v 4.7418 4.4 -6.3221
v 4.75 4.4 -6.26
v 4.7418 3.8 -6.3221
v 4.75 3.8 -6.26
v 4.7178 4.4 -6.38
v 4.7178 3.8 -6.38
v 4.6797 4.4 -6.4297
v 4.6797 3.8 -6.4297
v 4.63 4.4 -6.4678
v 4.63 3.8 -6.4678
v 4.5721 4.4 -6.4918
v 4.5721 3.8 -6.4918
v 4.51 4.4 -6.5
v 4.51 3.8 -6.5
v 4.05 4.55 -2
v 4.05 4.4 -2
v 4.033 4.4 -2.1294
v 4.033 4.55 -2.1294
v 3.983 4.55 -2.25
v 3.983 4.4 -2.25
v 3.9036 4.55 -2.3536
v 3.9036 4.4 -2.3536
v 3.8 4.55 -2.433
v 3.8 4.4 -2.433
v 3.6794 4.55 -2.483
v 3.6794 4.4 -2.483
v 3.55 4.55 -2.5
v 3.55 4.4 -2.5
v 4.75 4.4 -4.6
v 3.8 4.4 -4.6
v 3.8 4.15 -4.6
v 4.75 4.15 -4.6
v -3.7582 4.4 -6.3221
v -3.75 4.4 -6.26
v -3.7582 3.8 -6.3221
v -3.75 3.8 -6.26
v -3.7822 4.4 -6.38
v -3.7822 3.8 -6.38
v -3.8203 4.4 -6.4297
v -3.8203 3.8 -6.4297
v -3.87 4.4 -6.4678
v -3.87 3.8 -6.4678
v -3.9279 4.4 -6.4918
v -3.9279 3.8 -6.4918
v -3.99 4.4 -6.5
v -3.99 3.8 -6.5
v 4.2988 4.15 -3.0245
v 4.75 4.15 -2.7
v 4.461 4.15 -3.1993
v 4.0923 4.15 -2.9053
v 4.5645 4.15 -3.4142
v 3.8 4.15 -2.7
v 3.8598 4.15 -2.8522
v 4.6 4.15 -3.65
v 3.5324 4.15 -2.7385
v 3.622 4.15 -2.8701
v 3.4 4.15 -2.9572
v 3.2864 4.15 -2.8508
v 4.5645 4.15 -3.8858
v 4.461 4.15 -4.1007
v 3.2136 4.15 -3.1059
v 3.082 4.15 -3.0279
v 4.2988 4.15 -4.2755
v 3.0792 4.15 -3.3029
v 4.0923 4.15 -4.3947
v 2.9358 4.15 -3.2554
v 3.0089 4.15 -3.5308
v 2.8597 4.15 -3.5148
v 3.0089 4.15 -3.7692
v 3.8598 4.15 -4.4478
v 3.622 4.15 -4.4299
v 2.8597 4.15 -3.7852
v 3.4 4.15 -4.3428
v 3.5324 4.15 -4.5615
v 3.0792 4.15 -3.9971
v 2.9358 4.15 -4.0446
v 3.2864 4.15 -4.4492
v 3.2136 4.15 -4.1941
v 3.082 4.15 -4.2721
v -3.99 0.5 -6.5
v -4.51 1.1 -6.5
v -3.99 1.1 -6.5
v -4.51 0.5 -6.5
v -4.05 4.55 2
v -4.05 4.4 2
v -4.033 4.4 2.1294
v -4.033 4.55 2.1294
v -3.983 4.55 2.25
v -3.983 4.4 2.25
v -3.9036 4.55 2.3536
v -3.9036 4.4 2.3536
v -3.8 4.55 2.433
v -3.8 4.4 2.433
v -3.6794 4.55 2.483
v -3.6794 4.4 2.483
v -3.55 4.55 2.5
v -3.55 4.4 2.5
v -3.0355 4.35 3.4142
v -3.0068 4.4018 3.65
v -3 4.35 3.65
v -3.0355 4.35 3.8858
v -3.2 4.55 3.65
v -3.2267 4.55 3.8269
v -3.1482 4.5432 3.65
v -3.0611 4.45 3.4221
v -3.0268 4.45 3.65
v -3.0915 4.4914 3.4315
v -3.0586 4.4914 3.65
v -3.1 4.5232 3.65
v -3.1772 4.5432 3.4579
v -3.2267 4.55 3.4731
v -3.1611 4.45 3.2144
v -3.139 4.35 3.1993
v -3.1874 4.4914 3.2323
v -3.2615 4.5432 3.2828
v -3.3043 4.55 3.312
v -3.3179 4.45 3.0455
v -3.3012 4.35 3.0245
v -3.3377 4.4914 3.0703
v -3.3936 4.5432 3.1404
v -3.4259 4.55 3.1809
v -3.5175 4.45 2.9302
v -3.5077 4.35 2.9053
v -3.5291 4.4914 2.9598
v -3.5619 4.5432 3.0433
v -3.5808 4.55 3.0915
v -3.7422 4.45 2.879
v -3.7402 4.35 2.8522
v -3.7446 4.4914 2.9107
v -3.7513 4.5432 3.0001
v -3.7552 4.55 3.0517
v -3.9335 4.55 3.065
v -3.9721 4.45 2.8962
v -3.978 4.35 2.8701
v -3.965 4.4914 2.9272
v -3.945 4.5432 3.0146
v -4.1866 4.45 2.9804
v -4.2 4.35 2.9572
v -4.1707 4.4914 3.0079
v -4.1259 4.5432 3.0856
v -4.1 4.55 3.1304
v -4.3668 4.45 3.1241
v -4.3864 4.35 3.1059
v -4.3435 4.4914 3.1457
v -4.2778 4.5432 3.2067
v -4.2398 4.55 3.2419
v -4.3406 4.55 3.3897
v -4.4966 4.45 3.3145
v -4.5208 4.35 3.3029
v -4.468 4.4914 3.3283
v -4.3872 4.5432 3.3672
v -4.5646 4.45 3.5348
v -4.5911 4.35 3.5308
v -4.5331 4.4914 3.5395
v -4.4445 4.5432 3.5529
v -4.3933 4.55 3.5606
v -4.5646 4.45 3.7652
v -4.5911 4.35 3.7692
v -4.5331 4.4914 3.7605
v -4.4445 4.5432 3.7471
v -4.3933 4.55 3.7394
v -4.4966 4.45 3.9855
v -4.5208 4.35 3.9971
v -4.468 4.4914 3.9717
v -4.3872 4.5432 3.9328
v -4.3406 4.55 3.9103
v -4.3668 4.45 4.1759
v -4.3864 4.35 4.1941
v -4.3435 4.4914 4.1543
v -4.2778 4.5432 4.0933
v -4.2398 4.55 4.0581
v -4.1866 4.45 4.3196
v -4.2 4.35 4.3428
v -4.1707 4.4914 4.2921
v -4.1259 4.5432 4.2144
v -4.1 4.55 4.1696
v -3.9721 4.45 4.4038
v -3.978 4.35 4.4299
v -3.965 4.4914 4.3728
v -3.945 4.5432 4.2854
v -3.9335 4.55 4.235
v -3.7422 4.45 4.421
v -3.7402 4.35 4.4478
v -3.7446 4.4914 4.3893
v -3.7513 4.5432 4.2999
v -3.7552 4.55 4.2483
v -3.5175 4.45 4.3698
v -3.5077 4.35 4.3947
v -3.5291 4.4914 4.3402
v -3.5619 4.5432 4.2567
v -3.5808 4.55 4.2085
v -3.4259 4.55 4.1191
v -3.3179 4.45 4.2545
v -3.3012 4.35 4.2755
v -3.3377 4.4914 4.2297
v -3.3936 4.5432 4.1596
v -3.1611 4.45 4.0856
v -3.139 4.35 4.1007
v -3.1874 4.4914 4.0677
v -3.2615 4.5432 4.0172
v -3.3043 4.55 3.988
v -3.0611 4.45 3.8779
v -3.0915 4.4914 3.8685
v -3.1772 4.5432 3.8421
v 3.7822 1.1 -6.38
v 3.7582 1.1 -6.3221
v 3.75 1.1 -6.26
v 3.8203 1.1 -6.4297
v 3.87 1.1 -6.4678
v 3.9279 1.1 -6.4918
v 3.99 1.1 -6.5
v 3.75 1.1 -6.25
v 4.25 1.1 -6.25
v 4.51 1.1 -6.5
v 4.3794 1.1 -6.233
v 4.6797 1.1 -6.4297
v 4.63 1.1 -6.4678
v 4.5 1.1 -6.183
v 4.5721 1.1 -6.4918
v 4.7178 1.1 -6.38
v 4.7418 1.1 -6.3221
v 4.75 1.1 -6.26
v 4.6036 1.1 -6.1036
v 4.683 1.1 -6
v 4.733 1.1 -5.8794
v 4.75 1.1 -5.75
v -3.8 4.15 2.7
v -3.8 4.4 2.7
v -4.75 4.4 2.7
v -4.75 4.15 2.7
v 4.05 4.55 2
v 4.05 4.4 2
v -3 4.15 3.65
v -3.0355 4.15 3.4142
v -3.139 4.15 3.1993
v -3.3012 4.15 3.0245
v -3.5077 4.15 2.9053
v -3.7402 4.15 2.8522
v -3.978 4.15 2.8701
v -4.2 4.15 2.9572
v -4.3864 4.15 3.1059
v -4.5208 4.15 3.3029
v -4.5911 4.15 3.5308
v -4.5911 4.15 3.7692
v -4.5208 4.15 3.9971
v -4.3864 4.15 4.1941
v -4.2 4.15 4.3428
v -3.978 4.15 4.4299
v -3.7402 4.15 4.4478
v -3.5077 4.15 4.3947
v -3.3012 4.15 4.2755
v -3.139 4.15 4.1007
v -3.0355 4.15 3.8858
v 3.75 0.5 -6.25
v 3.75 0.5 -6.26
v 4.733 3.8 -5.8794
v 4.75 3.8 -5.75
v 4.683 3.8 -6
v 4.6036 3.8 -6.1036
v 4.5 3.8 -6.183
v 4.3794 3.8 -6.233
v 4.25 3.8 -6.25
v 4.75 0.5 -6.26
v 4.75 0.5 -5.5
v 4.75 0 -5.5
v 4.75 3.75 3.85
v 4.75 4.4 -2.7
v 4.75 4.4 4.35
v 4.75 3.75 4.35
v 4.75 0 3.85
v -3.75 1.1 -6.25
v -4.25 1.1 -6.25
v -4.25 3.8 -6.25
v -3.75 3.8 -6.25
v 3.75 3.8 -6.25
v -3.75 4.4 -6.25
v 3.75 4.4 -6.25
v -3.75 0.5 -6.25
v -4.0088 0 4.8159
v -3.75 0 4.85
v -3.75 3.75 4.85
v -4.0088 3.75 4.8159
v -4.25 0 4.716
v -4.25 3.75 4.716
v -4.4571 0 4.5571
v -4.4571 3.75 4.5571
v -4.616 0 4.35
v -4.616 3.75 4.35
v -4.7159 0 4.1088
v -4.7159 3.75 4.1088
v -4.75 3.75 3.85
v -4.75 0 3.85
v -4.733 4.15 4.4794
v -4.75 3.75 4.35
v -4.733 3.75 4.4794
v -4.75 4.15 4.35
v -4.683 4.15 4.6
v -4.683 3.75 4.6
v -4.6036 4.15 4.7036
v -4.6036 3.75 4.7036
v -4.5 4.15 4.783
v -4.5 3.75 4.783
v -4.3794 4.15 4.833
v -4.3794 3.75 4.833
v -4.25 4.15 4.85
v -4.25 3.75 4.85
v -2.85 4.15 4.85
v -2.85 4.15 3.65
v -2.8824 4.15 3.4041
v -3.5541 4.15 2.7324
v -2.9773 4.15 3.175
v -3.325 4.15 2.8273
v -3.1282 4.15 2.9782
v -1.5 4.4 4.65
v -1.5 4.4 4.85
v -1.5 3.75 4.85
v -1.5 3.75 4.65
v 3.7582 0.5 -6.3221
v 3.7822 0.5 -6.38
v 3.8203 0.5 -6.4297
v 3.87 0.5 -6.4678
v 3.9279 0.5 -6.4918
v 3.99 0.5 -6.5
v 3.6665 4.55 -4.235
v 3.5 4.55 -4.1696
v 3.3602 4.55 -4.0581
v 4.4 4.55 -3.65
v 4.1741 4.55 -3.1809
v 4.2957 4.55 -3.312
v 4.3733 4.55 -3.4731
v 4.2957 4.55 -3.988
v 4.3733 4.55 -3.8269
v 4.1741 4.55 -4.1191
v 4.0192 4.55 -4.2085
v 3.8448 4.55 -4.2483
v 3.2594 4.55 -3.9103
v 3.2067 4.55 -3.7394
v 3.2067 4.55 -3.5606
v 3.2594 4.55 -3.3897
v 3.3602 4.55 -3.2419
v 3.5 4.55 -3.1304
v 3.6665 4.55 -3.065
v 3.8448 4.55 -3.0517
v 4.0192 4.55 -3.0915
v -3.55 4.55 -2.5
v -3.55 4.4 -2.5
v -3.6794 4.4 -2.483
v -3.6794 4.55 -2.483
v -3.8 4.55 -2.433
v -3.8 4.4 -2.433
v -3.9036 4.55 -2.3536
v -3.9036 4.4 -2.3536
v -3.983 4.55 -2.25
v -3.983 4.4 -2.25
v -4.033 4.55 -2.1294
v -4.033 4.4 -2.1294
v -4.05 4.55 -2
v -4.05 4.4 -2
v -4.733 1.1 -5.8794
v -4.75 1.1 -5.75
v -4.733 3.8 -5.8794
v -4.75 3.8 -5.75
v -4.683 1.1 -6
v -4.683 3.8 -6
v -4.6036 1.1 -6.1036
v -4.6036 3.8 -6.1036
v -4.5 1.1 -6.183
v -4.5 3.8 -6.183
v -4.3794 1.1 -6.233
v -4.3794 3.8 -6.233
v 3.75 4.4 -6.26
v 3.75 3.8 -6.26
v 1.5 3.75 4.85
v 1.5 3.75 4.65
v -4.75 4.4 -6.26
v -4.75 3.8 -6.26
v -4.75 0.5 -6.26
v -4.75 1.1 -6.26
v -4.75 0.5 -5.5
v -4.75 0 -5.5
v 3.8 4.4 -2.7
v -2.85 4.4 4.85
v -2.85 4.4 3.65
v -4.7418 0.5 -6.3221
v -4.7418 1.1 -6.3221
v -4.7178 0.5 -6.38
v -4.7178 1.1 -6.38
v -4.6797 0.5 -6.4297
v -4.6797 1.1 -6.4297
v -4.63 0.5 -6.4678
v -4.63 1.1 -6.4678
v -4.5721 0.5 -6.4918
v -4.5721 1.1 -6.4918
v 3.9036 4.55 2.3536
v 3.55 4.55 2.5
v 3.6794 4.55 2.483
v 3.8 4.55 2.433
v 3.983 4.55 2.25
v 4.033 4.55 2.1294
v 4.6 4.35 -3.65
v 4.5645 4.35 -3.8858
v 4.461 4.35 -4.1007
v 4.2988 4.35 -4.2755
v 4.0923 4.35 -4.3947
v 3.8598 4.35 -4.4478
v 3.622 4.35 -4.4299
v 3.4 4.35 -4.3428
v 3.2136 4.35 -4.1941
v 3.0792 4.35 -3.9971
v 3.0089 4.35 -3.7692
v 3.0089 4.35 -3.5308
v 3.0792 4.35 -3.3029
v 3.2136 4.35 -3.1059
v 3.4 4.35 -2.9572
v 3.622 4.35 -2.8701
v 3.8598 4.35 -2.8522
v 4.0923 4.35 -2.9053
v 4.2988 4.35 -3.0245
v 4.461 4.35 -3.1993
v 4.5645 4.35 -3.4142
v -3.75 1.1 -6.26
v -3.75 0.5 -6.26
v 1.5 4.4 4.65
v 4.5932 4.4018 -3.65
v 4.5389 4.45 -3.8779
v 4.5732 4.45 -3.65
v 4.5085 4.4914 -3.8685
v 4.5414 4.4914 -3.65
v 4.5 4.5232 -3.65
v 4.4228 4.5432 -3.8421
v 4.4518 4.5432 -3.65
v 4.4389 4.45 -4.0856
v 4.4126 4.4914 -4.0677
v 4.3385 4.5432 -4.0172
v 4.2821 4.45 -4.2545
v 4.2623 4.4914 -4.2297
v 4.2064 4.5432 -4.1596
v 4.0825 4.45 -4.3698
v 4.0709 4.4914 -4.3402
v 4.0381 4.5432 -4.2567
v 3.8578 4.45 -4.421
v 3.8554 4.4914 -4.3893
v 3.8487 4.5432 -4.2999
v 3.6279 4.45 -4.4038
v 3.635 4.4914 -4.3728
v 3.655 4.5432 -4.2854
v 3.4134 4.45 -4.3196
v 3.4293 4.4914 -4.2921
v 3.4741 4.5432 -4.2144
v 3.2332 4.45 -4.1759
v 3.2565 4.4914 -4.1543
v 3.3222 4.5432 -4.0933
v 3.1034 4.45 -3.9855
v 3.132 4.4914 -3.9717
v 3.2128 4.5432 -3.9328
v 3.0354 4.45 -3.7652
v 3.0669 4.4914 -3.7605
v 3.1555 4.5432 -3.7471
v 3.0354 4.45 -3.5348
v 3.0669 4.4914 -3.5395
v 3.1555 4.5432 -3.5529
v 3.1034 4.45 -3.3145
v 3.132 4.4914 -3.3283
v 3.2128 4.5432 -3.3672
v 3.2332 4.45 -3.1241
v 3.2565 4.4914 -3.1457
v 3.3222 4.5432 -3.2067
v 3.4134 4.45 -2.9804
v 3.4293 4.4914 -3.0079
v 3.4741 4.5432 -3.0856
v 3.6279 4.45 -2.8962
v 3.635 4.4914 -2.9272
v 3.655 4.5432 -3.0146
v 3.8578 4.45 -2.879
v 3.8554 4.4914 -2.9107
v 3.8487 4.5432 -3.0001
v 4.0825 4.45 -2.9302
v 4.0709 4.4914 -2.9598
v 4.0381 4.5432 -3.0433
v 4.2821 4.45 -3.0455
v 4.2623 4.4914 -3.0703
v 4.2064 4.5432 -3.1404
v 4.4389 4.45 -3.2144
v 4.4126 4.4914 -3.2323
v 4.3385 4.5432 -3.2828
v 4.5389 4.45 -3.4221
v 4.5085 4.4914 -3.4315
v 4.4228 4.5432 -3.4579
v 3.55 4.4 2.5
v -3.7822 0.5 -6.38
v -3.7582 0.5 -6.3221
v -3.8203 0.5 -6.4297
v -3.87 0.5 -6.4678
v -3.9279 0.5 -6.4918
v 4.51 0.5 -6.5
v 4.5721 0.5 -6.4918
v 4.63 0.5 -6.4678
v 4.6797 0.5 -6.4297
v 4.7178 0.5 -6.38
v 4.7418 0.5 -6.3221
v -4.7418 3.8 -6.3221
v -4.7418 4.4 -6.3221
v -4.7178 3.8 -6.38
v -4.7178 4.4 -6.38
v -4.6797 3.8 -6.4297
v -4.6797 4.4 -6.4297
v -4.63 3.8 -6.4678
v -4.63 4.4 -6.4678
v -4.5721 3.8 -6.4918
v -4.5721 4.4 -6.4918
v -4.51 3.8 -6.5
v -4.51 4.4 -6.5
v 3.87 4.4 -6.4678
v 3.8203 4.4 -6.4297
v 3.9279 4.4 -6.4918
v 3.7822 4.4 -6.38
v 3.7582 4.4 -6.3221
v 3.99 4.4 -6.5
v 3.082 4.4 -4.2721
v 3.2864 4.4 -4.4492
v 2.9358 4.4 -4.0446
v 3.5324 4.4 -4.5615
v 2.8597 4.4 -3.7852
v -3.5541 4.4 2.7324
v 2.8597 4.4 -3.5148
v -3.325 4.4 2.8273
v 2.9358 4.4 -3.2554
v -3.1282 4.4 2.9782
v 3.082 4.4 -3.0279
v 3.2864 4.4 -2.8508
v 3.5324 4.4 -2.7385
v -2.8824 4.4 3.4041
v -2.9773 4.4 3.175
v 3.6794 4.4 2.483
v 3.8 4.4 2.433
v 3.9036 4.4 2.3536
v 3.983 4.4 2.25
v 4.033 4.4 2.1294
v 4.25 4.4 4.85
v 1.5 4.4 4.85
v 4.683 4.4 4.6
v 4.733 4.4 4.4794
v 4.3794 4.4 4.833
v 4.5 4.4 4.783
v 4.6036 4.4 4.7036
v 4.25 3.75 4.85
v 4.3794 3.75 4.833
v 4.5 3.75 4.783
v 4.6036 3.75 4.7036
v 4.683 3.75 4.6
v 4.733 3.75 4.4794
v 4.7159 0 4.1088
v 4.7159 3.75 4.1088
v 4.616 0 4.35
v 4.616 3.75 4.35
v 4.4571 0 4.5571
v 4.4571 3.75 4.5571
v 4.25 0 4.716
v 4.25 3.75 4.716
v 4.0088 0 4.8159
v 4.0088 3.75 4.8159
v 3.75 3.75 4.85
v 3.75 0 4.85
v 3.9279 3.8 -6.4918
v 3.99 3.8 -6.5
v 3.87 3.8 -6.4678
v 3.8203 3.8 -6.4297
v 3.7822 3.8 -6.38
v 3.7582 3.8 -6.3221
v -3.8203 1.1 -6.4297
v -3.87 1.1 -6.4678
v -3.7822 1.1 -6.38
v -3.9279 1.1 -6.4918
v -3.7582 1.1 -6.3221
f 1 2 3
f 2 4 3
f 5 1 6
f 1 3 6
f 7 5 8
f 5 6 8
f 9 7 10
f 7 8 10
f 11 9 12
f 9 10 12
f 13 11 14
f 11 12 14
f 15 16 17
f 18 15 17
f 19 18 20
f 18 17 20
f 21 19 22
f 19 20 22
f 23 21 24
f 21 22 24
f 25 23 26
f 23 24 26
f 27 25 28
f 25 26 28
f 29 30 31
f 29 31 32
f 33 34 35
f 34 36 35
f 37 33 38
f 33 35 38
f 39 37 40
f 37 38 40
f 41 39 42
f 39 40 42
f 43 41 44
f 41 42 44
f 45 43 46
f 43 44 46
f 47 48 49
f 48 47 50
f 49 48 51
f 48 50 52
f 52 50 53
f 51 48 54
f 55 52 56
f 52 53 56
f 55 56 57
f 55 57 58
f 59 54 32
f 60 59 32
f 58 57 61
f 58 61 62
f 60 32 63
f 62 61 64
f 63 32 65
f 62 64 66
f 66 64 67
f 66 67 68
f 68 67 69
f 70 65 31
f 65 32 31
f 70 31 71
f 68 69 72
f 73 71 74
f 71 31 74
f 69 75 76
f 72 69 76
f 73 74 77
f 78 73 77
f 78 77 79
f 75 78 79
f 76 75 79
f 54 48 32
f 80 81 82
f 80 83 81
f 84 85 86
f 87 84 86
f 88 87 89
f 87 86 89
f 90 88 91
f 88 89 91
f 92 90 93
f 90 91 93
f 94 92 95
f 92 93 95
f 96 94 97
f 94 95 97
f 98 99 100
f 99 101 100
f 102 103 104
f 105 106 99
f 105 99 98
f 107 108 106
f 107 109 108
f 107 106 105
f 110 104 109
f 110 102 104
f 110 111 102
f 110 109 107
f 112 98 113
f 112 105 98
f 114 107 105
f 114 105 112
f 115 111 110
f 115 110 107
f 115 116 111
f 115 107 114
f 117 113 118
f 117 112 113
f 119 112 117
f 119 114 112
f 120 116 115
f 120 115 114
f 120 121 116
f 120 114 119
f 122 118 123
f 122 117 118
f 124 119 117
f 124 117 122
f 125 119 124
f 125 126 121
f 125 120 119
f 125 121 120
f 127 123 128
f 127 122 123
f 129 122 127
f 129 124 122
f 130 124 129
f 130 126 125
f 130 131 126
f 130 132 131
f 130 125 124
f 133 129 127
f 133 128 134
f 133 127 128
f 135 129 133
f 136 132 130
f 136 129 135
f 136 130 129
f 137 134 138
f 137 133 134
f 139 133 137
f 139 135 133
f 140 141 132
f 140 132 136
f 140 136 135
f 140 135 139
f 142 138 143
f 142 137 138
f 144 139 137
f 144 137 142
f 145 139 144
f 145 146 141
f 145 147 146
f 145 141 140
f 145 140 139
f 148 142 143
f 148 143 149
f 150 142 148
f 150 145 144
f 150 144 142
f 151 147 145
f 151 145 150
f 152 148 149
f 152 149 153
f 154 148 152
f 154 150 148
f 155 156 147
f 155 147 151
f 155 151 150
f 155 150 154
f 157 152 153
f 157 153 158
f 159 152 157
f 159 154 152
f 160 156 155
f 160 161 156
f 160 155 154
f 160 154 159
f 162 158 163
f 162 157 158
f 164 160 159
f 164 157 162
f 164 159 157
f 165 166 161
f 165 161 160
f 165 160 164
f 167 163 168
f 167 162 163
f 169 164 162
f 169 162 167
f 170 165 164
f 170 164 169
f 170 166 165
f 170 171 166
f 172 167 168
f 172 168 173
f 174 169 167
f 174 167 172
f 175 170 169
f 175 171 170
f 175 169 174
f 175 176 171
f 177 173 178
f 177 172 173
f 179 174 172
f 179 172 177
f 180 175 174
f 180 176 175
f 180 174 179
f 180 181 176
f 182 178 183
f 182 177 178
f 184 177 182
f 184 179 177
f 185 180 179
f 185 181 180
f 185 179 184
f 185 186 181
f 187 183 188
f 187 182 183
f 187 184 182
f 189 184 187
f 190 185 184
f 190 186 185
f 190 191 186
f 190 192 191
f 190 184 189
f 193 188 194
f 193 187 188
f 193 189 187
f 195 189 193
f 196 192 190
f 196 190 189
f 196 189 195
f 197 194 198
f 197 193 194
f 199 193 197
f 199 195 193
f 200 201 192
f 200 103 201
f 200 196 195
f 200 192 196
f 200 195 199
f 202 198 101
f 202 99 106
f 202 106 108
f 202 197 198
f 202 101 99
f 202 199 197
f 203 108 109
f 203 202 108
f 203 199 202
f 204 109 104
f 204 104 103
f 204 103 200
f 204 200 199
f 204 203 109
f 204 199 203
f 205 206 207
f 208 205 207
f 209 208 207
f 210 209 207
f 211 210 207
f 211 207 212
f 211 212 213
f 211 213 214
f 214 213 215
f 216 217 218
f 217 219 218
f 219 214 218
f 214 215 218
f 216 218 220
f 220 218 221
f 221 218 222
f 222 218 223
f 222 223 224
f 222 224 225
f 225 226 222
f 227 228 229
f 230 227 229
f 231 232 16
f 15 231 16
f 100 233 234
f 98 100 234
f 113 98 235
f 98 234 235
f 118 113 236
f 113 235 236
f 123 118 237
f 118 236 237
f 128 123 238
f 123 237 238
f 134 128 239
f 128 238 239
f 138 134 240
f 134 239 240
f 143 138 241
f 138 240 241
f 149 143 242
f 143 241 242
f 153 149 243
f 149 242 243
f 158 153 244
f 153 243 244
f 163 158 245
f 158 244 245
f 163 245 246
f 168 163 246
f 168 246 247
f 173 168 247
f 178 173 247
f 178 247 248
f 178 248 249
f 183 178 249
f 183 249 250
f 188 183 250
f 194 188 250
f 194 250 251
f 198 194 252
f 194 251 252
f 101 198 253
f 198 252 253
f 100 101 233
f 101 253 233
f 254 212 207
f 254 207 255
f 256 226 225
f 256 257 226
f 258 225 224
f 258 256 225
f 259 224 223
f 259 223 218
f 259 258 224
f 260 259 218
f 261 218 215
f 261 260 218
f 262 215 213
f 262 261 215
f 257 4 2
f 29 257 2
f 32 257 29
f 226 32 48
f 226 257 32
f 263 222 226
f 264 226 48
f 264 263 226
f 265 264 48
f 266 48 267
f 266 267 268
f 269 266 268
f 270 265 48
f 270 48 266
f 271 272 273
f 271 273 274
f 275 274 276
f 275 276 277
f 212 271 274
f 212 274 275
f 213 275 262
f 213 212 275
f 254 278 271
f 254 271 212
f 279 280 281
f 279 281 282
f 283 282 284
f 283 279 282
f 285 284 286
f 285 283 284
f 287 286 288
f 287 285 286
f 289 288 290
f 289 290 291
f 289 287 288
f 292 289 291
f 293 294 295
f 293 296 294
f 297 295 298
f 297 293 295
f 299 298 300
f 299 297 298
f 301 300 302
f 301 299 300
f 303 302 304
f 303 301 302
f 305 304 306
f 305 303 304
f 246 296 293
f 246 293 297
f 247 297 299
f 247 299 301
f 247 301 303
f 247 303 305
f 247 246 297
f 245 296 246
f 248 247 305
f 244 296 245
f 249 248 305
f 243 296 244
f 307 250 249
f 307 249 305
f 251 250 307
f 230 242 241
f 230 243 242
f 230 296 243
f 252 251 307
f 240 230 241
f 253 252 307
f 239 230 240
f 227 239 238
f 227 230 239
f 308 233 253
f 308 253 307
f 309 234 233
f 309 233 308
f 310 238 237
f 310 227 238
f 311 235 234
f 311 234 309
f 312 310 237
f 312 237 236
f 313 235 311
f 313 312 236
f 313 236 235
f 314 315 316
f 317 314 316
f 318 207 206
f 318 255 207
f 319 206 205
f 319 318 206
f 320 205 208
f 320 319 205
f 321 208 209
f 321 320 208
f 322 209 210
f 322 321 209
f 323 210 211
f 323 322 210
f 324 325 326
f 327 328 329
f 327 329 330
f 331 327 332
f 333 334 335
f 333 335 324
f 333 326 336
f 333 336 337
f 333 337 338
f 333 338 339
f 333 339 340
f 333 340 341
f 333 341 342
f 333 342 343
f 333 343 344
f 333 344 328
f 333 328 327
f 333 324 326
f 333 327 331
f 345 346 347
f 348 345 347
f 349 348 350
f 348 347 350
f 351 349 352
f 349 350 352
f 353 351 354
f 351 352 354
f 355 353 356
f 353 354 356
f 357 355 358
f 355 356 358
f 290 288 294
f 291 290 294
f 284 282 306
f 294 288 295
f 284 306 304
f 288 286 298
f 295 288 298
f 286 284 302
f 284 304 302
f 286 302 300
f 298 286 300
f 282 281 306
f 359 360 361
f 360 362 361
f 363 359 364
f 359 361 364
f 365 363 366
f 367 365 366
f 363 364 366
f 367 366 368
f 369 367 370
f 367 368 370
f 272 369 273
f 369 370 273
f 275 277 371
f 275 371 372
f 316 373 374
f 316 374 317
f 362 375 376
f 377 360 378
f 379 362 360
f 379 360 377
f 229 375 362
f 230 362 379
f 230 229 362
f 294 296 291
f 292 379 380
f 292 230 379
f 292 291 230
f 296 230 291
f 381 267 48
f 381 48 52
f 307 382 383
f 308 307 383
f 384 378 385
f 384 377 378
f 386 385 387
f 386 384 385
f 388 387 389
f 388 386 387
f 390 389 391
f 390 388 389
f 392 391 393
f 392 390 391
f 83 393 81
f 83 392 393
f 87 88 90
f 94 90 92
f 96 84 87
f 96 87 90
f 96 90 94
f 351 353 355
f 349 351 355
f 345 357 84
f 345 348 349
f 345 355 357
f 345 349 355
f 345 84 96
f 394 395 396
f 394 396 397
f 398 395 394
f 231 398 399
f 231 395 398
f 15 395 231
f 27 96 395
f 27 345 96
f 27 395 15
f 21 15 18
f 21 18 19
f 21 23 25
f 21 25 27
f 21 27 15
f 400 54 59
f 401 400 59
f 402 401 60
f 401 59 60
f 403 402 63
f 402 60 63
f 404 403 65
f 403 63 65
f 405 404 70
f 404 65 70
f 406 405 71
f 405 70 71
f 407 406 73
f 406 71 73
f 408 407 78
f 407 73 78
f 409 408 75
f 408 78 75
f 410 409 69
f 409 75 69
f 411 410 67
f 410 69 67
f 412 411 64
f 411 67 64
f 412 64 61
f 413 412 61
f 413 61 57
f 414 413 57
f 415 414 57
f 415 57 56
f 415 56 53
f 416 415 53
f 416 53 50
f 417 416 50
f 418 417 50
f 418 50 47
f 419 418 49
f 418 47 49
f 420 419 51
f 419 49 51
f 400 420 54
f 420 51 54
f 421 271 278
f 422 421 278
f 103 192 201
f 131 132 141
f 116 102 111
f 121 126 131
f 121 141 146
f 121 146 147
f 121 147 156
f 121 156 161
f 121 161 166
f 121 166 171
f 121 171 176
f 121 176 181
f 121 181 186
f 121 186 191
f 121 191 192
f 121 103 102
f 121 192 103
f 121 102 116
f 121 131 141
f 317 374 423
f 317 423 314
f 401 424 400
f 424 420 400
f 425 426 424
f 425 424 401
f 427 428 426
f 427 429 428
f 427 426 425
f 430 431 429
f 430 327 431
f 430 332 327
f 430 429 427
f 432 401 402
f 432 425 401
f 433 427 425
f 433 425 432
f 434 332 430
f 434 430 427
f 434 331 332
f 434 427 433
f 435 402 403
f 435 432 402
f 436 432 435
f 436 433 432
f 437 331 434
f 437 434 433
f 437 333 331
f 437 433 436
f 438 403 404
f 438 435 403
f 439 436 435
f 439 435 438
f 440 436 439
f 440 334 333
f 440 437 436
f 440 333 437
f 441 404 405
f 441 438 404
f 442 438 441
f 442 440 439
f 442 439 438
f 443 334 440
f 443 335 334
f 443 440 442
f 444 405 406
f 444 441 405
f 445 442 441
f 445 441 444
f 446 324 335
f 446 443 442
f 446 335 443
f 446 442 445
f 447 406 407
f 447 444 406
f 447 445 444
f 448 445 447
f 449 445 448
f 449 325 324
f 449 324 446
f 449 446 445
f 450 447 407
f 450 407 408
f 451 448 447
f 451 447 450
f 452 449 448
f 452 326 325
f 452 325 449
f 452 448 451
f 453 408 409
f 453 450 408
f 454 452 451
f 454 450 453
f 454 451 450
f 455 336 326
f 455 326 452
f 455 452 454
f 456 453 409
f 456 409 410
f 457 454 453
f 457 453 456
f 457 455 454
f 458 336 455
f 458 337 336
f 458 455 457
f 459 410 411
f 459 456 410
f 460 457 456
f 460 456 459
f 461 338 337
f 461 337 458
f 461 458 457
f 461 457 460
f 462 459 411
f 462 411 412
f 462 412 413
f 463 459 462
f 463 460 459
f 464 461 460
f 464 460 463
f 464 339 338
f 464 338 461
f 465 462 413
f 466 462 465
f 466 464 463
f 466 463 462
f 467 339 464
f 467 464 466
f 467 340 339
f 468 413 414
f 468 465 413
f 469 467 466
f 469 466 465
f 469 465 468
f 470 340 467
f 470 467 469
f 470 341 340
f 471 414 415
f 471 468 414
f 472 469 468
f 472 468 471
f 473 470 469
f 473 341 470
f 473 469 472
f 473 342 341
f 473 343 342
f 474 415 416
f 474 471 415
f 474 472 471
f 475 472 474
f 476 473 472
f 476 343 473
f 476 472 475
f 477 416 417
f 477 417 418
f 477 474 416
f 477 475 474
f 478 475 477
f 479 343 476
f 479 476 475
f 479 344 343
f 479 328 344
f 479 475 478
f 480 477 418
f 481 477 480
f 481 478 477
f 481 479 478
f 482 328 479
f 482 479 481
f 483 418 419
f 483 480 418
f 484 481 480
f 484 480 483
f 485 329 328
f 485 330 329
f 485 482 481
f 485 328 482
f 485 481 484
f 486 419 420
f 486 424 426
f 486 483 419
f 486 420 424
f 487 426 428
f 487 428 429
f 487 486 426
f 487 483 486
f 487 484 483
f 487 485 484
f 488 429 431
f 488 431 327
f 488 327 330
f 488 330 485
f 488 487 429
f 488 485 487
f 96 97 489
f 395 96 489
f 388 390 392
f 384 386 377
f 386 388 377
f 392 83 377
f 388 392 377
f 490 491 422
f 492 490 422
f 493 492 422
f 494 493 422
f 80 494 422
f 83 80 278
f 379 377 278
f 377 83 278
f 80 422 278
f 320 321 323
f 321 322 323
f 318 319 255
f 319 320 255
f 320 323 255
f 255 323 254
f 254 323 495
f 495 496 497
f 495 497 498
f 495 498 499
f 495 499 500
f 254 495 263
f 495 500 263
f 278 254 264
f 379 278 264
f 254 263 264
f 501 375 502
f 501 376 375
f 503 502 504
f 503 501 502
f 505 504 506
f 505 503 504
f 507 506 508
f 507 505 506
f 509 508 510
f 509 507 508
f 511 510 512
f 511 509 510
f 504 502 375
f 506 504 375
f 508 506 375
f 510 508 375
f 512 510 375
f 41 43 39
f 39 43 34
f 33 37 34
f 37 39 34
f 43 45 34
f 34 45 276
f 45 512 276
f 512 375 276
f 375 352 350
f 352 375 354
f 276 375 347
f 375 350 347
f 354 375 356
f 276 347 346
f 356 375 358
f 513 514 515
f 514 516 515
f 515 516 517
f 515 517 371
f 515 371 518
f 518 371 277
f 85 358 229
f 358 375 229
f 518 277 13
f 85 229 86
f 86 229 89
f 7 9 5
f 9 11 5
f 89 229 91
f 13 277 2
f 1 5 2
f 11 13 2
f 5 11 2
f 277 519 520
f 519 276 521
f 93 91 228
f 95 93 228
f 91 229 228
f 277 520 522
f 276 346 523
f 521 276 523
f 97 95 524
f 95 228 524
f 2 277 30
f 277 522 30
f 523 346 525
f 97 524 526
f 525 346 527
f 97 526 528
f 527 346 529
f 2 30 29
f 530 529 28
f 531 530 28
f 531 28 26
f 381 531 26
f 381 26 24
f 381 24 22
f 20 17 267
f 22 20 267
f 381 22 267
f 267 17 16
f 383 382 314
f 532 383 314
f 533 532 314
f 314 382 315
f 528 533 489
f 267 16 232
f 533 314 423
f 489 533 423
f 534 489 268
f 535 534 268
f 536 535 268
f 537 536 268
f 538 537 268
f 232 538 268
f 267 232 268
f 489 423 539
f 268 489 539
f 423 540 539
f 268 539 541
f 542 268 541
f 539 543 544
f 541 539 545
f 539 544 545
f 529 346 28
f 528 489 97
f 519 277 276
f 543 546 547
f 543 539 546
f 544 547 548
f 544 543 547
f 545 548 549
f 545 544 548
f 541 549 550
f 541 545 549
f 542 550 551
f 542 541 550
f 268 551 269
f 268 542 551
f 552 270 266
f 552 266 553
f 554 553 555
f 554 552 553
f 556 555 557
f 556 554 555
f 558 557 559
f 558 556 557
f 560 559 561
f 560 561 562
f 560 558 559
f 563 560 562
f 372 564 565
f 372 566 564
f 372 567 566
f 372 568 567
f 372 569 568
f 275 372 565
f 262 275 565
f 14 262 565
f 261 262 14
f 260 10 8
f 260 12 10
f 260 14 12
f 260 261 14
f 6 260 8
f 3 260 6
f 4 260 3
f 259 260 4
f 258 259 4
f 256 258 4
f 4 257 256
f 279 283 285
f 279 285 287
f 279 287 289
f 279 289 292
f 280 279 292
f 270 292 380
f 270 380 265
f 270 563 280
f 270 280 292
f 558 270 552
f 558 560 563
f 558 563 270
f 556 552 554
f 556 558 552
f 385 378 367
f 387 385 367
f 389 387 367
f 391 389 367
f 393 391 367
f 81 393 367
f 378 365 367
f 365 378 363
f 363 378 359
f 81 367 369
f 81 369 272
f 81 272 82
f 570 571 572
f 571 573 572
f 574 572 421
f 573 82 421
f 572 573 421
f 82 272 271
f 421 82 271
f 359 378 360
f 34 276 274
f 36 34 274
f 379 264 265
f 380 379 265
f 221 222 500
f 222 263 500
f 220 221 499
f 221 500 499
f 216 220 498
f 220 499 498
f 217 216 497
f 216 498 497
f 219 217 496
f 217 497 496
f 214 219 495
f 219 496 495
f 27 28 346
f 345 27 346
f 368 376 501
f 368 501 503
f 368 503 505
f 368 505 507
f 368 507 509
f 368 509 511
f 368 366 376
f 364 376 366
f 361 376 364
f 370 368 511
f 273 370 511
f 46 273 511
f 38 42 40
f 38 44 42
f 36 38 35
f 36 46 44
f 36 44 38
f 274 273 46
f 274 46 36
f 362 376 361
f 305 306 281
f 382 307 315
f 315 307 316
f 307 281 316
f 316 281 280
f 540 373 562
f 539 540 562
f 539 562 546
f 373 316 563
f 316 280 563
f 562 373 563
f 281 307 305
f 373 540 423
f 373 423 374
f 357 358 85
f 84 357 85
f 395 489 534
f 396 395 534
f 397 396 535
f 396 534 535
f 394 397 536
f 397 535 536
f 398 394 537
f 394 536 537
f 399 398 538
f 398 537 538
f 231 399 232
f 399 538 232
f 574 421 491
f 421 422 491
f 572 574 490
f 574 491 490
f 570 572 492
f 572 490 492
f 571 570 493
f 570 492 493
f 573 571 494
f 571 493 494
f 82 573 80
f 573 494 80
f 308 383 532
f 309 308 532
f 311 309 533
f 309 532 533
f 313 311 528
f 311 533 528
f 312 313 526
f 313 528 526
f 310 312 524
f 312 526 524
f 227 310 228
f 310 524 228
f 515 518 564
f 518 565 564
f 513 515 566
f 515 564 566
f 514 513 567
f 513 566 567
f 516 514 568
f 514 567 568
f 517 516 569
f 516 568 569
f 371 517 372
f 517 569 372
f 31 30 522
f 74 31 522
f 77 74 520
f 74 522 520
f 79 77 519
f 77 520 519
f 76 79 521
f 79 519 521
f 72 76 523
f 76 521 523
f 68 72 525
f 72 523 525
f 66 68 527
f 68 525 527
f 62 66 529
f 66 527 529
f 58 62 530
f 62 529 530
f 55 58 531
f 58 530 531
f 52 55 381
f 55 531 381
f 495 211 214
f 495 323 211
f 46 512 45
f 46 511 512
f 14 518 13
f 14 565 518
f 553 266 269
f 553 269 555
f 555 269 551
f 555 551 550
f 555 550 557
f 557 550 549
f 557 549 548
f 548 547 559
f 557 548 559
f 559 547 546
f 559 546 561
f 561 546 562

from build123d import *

# Parameters (mm, degrees)
SKETCH006_W     = 9.5
SKETCH006_H     = 11.1
PAD004_DEPTH    = 4.4
PAD005_DEPTH    = 0.15
POCKET002_DEPTH = 0.25
SKETCH009_R     = 0.8
PAD006_DEPTH    = 0.4
FILLET003_R     = 0.2
SKETCH010_W     = 1
SKETCH010_H     = 0.6
PAD007_DEPTH    = 0.25
FILLET004_R     = 0.24
SKETCH011_W     = 0.75
SKETCH011_H     = 0.5
POCKET003_DEPTH = 9.5
FILLET005_R     = 0.5
POCKET004_DEPTH = 3.75
FILLET006_R     = 0.5
SKETCH013_W     = 3
SKETCH013_H     = 0.65
POCKET005_DEPTH = 0.2


with BuildPart() as part:
    # Sketch006 → Pad004 (new body)
    with BuildSketch(Plane.XZ):
        with Locations((0, -0.7)):
            Rectangle(SKETCH006_W, SKETCH006_H)
    extrude(amount=-PAD004_DEPTH)

    # Sketch007 (on Face6 of Pad004) → Pad005 (join)
    with BuildSketch(Plane(origin=(0, 4.4, 0), x_dir=(1, 0, 0), z_dir=(0, 1, 0))):
        with BuildLine():
            Line((-4.05, 2), (-4.05, -2))
            ThreePointArc((-4.05, -2), (-3.903553, -2.353553), (-3.55, -2.5))
            Line((-3.55, -2.5), (3.55, -2.5))
            ThreePointArc((3.55, -2.5), (3.903553, -2.353553), (4.05, -2))
            Line((4.05, -2), (4.05, 2))
            ThreePointArc((4.05, 2), (3.903553, 2.353553), (3.55, 2.5))
            Line((3.55, 2.5), (-3.55, 2.5))
            ThreePointArc((-3.55, 2.5), (-3.903553, 2.353553), (-4.05, 2))
        make_face()
    extrude(amount=PAD005_DEPTH)

    # Sketch008 (on Face5 of Pad005) → Pocket002 (cut)
    with BuildSketch(Plane(origin=(0, 4.4, 0), x_dir=(1, 0, 0), z_dir=(0, 1, 0))):
        with BuildLine():
            Line((-3.8, -2.7), (-4.75, -2.7))
            Line((-4.75, -2.7), (-4.75, -4.85))
            Line((-4.75, -4.85), (-2.85, -4.85))
            Line((-2.85, -4.85), (-2.85, -3.65))
            ThreePointArc((-2.85, -3.65), (-3.128249, -2.978249), (-3.8, -2.7))
        make_face()
        with BuildLine():
            Line((3.8, 4.6), (4.75, 4.6))
            Line((4.75, 4.6), (4.75, 2.7))
            Line((4.75, 2.7), (3.8, 2.7))
            ThreePointArc((3.8, 4.6), (2.85, 3.65), (3.8, 2.7))
        make_face()
    extrude(amount=-POCKET002_DEPTH, mode=Mode.SUBTRACT)

    # Sketch009 (on Face22 of Pocket002) → Pad006 (join)
    with BuildSketch(Plane(origin=(0, 4.15, 0), x_dir=(1, 0, 0), z_dir=(0, 1, 0))):
        with Locations((3.8, 3.65)):
            Circle(SKETCH009_R)
        with Locations((-3.8, -3.65)):
            Circle(SKETCH009_R)
    extrude(amount=PAD006_DEPTH)

    # Fillet003
    fillet003_edges = [part.edges().sort_by_distance(p)[0] for p in [
        (3, 4.55, -3.65),
        (-4.6, 4.55, 3.65),
    ]]
    fillet(fillet003_edges, radius=FILLET003_R)

    # Sketch010 (on Face12 of Fillet003) → Pad007 (join)
    with BuildSketch(Plane(origin=(0, 0, -6.25), x_dir=(1, 0, 0), z_dir=(0, 0, -1))):
        with Locations((-4.25, -0.8)):
            Rectangle(SKETCH010_W, SKETCH010_H)
        with Locations((-4.25, -4.1)):
            Rectangle(SKETCH010_W, SKETCH010_H)
        with Locations((4.25, -0.8)):
            Rectangle(SKETCH010_W, SKETCH010_H)
        with Locations((4.25, -4.1)):
            Rectangle(SKETCH010_W, SKETCH010_H)
    extrude(amount=PAD007_DEPTH)

    # Fillet004
    fillet004_edges = [part.edges().sort_by_distance(p)[0] for p in [
        (4.75, 4.1, -6.5),
        (4.75, 0.8, -6.5),
        (3.75, 0.8, -6.5),
        (3.75, 4.1, -6.5),
        (-3.75, 0.8, -6.5),
        (-4.75, 0.8, -6.5),
        (-3.75, 4.1, -6.5),
        (-4.75, 4.1, -6.5),
    ]]
    fillet(fillet004_edges, radius=FILLET004_R)

    # Sketch011 (on Face16 of Fillet004) → Pocket003 (cut)
    with BuildSketch(Plane(origin=(4.75, 0, 0), x_dir=(0, 0, 1), z_dir=(1, 0, 0))):
        with Locations((-5.875, -0.25)):
            Rectangle(SKETCH011_W, SKETCH011_H)
    extrude(amount=-POCKET003_DEPTH, mode=Mode.SUBTRACT)

    # Fillet005
    fillet005_edges = [part.edges().sort_by_distance(p)[0] for p in [
        (4.75, 2.45, -6.25),
        (-4.75, 2.45, -6.25),
    ]]
    fillet(fillet005_edges, radius=FILLET005_R)

    # Sketch012 (on Face22 of Fillet005) → Pocket004 (cut)
    with BuildSketch(Plane.XZ):
        with BuildLine():
            Line((3.75, 4.85), (3.75, 5.85))
            Line((3.75, 5.85), (5.75, 5.85))
            Line((5.75, 5.85), (5.75, 3.85))
            Line((5.75, 3.85), (4.75, 3.85))
            ThreePointArc((4.75, 3.85), (4.457107, 4.557107), (3.75, 4.85))
        make_face()
        with BuildLine():
            ThreePointArc((-3.75, 4.85), (-4.457107, 4.557107), (-4.75, 3.85))
            Line((-5.75, 3.85), (-4.75, 3.85))
            Line((-5.75, 5.85), (-5.75, 3.85))
            Line((-3.75, 5.85), (-5.75, 5.85))
            Line((-3.75, 4.85), (-3.75, 5.85))
        make_face()
    extrude(amount=-POCKET004_DEPTH, mode=Mode.SUBTRACT)

    # Fillet006
    fillet006_edges = [part.edges().sort_by_distance(p)[0] for p in [
        (4.75, 4.075, 4.85),
        (-4.75, 3.95, 4.85),
    ]]
    fillet(fillet006_edges, radius=FILLET006_R)

    # Sketch013 (on Face16 of Fillet006) → Pocket005 (cut)
    with BuildSketch(Plane(origin=(0, 0, 4.85), x_dir=(-1, 0, 0), z_dir=(0, 0, 1))):
        with Locations((0, -4.075)):
            Rectangle(SKETCH013_W, SKETCH013_H)
    extrude(amount=-POCKET005_DEPTH, mode=Mode.SUBTRACT)


solid = part.part
